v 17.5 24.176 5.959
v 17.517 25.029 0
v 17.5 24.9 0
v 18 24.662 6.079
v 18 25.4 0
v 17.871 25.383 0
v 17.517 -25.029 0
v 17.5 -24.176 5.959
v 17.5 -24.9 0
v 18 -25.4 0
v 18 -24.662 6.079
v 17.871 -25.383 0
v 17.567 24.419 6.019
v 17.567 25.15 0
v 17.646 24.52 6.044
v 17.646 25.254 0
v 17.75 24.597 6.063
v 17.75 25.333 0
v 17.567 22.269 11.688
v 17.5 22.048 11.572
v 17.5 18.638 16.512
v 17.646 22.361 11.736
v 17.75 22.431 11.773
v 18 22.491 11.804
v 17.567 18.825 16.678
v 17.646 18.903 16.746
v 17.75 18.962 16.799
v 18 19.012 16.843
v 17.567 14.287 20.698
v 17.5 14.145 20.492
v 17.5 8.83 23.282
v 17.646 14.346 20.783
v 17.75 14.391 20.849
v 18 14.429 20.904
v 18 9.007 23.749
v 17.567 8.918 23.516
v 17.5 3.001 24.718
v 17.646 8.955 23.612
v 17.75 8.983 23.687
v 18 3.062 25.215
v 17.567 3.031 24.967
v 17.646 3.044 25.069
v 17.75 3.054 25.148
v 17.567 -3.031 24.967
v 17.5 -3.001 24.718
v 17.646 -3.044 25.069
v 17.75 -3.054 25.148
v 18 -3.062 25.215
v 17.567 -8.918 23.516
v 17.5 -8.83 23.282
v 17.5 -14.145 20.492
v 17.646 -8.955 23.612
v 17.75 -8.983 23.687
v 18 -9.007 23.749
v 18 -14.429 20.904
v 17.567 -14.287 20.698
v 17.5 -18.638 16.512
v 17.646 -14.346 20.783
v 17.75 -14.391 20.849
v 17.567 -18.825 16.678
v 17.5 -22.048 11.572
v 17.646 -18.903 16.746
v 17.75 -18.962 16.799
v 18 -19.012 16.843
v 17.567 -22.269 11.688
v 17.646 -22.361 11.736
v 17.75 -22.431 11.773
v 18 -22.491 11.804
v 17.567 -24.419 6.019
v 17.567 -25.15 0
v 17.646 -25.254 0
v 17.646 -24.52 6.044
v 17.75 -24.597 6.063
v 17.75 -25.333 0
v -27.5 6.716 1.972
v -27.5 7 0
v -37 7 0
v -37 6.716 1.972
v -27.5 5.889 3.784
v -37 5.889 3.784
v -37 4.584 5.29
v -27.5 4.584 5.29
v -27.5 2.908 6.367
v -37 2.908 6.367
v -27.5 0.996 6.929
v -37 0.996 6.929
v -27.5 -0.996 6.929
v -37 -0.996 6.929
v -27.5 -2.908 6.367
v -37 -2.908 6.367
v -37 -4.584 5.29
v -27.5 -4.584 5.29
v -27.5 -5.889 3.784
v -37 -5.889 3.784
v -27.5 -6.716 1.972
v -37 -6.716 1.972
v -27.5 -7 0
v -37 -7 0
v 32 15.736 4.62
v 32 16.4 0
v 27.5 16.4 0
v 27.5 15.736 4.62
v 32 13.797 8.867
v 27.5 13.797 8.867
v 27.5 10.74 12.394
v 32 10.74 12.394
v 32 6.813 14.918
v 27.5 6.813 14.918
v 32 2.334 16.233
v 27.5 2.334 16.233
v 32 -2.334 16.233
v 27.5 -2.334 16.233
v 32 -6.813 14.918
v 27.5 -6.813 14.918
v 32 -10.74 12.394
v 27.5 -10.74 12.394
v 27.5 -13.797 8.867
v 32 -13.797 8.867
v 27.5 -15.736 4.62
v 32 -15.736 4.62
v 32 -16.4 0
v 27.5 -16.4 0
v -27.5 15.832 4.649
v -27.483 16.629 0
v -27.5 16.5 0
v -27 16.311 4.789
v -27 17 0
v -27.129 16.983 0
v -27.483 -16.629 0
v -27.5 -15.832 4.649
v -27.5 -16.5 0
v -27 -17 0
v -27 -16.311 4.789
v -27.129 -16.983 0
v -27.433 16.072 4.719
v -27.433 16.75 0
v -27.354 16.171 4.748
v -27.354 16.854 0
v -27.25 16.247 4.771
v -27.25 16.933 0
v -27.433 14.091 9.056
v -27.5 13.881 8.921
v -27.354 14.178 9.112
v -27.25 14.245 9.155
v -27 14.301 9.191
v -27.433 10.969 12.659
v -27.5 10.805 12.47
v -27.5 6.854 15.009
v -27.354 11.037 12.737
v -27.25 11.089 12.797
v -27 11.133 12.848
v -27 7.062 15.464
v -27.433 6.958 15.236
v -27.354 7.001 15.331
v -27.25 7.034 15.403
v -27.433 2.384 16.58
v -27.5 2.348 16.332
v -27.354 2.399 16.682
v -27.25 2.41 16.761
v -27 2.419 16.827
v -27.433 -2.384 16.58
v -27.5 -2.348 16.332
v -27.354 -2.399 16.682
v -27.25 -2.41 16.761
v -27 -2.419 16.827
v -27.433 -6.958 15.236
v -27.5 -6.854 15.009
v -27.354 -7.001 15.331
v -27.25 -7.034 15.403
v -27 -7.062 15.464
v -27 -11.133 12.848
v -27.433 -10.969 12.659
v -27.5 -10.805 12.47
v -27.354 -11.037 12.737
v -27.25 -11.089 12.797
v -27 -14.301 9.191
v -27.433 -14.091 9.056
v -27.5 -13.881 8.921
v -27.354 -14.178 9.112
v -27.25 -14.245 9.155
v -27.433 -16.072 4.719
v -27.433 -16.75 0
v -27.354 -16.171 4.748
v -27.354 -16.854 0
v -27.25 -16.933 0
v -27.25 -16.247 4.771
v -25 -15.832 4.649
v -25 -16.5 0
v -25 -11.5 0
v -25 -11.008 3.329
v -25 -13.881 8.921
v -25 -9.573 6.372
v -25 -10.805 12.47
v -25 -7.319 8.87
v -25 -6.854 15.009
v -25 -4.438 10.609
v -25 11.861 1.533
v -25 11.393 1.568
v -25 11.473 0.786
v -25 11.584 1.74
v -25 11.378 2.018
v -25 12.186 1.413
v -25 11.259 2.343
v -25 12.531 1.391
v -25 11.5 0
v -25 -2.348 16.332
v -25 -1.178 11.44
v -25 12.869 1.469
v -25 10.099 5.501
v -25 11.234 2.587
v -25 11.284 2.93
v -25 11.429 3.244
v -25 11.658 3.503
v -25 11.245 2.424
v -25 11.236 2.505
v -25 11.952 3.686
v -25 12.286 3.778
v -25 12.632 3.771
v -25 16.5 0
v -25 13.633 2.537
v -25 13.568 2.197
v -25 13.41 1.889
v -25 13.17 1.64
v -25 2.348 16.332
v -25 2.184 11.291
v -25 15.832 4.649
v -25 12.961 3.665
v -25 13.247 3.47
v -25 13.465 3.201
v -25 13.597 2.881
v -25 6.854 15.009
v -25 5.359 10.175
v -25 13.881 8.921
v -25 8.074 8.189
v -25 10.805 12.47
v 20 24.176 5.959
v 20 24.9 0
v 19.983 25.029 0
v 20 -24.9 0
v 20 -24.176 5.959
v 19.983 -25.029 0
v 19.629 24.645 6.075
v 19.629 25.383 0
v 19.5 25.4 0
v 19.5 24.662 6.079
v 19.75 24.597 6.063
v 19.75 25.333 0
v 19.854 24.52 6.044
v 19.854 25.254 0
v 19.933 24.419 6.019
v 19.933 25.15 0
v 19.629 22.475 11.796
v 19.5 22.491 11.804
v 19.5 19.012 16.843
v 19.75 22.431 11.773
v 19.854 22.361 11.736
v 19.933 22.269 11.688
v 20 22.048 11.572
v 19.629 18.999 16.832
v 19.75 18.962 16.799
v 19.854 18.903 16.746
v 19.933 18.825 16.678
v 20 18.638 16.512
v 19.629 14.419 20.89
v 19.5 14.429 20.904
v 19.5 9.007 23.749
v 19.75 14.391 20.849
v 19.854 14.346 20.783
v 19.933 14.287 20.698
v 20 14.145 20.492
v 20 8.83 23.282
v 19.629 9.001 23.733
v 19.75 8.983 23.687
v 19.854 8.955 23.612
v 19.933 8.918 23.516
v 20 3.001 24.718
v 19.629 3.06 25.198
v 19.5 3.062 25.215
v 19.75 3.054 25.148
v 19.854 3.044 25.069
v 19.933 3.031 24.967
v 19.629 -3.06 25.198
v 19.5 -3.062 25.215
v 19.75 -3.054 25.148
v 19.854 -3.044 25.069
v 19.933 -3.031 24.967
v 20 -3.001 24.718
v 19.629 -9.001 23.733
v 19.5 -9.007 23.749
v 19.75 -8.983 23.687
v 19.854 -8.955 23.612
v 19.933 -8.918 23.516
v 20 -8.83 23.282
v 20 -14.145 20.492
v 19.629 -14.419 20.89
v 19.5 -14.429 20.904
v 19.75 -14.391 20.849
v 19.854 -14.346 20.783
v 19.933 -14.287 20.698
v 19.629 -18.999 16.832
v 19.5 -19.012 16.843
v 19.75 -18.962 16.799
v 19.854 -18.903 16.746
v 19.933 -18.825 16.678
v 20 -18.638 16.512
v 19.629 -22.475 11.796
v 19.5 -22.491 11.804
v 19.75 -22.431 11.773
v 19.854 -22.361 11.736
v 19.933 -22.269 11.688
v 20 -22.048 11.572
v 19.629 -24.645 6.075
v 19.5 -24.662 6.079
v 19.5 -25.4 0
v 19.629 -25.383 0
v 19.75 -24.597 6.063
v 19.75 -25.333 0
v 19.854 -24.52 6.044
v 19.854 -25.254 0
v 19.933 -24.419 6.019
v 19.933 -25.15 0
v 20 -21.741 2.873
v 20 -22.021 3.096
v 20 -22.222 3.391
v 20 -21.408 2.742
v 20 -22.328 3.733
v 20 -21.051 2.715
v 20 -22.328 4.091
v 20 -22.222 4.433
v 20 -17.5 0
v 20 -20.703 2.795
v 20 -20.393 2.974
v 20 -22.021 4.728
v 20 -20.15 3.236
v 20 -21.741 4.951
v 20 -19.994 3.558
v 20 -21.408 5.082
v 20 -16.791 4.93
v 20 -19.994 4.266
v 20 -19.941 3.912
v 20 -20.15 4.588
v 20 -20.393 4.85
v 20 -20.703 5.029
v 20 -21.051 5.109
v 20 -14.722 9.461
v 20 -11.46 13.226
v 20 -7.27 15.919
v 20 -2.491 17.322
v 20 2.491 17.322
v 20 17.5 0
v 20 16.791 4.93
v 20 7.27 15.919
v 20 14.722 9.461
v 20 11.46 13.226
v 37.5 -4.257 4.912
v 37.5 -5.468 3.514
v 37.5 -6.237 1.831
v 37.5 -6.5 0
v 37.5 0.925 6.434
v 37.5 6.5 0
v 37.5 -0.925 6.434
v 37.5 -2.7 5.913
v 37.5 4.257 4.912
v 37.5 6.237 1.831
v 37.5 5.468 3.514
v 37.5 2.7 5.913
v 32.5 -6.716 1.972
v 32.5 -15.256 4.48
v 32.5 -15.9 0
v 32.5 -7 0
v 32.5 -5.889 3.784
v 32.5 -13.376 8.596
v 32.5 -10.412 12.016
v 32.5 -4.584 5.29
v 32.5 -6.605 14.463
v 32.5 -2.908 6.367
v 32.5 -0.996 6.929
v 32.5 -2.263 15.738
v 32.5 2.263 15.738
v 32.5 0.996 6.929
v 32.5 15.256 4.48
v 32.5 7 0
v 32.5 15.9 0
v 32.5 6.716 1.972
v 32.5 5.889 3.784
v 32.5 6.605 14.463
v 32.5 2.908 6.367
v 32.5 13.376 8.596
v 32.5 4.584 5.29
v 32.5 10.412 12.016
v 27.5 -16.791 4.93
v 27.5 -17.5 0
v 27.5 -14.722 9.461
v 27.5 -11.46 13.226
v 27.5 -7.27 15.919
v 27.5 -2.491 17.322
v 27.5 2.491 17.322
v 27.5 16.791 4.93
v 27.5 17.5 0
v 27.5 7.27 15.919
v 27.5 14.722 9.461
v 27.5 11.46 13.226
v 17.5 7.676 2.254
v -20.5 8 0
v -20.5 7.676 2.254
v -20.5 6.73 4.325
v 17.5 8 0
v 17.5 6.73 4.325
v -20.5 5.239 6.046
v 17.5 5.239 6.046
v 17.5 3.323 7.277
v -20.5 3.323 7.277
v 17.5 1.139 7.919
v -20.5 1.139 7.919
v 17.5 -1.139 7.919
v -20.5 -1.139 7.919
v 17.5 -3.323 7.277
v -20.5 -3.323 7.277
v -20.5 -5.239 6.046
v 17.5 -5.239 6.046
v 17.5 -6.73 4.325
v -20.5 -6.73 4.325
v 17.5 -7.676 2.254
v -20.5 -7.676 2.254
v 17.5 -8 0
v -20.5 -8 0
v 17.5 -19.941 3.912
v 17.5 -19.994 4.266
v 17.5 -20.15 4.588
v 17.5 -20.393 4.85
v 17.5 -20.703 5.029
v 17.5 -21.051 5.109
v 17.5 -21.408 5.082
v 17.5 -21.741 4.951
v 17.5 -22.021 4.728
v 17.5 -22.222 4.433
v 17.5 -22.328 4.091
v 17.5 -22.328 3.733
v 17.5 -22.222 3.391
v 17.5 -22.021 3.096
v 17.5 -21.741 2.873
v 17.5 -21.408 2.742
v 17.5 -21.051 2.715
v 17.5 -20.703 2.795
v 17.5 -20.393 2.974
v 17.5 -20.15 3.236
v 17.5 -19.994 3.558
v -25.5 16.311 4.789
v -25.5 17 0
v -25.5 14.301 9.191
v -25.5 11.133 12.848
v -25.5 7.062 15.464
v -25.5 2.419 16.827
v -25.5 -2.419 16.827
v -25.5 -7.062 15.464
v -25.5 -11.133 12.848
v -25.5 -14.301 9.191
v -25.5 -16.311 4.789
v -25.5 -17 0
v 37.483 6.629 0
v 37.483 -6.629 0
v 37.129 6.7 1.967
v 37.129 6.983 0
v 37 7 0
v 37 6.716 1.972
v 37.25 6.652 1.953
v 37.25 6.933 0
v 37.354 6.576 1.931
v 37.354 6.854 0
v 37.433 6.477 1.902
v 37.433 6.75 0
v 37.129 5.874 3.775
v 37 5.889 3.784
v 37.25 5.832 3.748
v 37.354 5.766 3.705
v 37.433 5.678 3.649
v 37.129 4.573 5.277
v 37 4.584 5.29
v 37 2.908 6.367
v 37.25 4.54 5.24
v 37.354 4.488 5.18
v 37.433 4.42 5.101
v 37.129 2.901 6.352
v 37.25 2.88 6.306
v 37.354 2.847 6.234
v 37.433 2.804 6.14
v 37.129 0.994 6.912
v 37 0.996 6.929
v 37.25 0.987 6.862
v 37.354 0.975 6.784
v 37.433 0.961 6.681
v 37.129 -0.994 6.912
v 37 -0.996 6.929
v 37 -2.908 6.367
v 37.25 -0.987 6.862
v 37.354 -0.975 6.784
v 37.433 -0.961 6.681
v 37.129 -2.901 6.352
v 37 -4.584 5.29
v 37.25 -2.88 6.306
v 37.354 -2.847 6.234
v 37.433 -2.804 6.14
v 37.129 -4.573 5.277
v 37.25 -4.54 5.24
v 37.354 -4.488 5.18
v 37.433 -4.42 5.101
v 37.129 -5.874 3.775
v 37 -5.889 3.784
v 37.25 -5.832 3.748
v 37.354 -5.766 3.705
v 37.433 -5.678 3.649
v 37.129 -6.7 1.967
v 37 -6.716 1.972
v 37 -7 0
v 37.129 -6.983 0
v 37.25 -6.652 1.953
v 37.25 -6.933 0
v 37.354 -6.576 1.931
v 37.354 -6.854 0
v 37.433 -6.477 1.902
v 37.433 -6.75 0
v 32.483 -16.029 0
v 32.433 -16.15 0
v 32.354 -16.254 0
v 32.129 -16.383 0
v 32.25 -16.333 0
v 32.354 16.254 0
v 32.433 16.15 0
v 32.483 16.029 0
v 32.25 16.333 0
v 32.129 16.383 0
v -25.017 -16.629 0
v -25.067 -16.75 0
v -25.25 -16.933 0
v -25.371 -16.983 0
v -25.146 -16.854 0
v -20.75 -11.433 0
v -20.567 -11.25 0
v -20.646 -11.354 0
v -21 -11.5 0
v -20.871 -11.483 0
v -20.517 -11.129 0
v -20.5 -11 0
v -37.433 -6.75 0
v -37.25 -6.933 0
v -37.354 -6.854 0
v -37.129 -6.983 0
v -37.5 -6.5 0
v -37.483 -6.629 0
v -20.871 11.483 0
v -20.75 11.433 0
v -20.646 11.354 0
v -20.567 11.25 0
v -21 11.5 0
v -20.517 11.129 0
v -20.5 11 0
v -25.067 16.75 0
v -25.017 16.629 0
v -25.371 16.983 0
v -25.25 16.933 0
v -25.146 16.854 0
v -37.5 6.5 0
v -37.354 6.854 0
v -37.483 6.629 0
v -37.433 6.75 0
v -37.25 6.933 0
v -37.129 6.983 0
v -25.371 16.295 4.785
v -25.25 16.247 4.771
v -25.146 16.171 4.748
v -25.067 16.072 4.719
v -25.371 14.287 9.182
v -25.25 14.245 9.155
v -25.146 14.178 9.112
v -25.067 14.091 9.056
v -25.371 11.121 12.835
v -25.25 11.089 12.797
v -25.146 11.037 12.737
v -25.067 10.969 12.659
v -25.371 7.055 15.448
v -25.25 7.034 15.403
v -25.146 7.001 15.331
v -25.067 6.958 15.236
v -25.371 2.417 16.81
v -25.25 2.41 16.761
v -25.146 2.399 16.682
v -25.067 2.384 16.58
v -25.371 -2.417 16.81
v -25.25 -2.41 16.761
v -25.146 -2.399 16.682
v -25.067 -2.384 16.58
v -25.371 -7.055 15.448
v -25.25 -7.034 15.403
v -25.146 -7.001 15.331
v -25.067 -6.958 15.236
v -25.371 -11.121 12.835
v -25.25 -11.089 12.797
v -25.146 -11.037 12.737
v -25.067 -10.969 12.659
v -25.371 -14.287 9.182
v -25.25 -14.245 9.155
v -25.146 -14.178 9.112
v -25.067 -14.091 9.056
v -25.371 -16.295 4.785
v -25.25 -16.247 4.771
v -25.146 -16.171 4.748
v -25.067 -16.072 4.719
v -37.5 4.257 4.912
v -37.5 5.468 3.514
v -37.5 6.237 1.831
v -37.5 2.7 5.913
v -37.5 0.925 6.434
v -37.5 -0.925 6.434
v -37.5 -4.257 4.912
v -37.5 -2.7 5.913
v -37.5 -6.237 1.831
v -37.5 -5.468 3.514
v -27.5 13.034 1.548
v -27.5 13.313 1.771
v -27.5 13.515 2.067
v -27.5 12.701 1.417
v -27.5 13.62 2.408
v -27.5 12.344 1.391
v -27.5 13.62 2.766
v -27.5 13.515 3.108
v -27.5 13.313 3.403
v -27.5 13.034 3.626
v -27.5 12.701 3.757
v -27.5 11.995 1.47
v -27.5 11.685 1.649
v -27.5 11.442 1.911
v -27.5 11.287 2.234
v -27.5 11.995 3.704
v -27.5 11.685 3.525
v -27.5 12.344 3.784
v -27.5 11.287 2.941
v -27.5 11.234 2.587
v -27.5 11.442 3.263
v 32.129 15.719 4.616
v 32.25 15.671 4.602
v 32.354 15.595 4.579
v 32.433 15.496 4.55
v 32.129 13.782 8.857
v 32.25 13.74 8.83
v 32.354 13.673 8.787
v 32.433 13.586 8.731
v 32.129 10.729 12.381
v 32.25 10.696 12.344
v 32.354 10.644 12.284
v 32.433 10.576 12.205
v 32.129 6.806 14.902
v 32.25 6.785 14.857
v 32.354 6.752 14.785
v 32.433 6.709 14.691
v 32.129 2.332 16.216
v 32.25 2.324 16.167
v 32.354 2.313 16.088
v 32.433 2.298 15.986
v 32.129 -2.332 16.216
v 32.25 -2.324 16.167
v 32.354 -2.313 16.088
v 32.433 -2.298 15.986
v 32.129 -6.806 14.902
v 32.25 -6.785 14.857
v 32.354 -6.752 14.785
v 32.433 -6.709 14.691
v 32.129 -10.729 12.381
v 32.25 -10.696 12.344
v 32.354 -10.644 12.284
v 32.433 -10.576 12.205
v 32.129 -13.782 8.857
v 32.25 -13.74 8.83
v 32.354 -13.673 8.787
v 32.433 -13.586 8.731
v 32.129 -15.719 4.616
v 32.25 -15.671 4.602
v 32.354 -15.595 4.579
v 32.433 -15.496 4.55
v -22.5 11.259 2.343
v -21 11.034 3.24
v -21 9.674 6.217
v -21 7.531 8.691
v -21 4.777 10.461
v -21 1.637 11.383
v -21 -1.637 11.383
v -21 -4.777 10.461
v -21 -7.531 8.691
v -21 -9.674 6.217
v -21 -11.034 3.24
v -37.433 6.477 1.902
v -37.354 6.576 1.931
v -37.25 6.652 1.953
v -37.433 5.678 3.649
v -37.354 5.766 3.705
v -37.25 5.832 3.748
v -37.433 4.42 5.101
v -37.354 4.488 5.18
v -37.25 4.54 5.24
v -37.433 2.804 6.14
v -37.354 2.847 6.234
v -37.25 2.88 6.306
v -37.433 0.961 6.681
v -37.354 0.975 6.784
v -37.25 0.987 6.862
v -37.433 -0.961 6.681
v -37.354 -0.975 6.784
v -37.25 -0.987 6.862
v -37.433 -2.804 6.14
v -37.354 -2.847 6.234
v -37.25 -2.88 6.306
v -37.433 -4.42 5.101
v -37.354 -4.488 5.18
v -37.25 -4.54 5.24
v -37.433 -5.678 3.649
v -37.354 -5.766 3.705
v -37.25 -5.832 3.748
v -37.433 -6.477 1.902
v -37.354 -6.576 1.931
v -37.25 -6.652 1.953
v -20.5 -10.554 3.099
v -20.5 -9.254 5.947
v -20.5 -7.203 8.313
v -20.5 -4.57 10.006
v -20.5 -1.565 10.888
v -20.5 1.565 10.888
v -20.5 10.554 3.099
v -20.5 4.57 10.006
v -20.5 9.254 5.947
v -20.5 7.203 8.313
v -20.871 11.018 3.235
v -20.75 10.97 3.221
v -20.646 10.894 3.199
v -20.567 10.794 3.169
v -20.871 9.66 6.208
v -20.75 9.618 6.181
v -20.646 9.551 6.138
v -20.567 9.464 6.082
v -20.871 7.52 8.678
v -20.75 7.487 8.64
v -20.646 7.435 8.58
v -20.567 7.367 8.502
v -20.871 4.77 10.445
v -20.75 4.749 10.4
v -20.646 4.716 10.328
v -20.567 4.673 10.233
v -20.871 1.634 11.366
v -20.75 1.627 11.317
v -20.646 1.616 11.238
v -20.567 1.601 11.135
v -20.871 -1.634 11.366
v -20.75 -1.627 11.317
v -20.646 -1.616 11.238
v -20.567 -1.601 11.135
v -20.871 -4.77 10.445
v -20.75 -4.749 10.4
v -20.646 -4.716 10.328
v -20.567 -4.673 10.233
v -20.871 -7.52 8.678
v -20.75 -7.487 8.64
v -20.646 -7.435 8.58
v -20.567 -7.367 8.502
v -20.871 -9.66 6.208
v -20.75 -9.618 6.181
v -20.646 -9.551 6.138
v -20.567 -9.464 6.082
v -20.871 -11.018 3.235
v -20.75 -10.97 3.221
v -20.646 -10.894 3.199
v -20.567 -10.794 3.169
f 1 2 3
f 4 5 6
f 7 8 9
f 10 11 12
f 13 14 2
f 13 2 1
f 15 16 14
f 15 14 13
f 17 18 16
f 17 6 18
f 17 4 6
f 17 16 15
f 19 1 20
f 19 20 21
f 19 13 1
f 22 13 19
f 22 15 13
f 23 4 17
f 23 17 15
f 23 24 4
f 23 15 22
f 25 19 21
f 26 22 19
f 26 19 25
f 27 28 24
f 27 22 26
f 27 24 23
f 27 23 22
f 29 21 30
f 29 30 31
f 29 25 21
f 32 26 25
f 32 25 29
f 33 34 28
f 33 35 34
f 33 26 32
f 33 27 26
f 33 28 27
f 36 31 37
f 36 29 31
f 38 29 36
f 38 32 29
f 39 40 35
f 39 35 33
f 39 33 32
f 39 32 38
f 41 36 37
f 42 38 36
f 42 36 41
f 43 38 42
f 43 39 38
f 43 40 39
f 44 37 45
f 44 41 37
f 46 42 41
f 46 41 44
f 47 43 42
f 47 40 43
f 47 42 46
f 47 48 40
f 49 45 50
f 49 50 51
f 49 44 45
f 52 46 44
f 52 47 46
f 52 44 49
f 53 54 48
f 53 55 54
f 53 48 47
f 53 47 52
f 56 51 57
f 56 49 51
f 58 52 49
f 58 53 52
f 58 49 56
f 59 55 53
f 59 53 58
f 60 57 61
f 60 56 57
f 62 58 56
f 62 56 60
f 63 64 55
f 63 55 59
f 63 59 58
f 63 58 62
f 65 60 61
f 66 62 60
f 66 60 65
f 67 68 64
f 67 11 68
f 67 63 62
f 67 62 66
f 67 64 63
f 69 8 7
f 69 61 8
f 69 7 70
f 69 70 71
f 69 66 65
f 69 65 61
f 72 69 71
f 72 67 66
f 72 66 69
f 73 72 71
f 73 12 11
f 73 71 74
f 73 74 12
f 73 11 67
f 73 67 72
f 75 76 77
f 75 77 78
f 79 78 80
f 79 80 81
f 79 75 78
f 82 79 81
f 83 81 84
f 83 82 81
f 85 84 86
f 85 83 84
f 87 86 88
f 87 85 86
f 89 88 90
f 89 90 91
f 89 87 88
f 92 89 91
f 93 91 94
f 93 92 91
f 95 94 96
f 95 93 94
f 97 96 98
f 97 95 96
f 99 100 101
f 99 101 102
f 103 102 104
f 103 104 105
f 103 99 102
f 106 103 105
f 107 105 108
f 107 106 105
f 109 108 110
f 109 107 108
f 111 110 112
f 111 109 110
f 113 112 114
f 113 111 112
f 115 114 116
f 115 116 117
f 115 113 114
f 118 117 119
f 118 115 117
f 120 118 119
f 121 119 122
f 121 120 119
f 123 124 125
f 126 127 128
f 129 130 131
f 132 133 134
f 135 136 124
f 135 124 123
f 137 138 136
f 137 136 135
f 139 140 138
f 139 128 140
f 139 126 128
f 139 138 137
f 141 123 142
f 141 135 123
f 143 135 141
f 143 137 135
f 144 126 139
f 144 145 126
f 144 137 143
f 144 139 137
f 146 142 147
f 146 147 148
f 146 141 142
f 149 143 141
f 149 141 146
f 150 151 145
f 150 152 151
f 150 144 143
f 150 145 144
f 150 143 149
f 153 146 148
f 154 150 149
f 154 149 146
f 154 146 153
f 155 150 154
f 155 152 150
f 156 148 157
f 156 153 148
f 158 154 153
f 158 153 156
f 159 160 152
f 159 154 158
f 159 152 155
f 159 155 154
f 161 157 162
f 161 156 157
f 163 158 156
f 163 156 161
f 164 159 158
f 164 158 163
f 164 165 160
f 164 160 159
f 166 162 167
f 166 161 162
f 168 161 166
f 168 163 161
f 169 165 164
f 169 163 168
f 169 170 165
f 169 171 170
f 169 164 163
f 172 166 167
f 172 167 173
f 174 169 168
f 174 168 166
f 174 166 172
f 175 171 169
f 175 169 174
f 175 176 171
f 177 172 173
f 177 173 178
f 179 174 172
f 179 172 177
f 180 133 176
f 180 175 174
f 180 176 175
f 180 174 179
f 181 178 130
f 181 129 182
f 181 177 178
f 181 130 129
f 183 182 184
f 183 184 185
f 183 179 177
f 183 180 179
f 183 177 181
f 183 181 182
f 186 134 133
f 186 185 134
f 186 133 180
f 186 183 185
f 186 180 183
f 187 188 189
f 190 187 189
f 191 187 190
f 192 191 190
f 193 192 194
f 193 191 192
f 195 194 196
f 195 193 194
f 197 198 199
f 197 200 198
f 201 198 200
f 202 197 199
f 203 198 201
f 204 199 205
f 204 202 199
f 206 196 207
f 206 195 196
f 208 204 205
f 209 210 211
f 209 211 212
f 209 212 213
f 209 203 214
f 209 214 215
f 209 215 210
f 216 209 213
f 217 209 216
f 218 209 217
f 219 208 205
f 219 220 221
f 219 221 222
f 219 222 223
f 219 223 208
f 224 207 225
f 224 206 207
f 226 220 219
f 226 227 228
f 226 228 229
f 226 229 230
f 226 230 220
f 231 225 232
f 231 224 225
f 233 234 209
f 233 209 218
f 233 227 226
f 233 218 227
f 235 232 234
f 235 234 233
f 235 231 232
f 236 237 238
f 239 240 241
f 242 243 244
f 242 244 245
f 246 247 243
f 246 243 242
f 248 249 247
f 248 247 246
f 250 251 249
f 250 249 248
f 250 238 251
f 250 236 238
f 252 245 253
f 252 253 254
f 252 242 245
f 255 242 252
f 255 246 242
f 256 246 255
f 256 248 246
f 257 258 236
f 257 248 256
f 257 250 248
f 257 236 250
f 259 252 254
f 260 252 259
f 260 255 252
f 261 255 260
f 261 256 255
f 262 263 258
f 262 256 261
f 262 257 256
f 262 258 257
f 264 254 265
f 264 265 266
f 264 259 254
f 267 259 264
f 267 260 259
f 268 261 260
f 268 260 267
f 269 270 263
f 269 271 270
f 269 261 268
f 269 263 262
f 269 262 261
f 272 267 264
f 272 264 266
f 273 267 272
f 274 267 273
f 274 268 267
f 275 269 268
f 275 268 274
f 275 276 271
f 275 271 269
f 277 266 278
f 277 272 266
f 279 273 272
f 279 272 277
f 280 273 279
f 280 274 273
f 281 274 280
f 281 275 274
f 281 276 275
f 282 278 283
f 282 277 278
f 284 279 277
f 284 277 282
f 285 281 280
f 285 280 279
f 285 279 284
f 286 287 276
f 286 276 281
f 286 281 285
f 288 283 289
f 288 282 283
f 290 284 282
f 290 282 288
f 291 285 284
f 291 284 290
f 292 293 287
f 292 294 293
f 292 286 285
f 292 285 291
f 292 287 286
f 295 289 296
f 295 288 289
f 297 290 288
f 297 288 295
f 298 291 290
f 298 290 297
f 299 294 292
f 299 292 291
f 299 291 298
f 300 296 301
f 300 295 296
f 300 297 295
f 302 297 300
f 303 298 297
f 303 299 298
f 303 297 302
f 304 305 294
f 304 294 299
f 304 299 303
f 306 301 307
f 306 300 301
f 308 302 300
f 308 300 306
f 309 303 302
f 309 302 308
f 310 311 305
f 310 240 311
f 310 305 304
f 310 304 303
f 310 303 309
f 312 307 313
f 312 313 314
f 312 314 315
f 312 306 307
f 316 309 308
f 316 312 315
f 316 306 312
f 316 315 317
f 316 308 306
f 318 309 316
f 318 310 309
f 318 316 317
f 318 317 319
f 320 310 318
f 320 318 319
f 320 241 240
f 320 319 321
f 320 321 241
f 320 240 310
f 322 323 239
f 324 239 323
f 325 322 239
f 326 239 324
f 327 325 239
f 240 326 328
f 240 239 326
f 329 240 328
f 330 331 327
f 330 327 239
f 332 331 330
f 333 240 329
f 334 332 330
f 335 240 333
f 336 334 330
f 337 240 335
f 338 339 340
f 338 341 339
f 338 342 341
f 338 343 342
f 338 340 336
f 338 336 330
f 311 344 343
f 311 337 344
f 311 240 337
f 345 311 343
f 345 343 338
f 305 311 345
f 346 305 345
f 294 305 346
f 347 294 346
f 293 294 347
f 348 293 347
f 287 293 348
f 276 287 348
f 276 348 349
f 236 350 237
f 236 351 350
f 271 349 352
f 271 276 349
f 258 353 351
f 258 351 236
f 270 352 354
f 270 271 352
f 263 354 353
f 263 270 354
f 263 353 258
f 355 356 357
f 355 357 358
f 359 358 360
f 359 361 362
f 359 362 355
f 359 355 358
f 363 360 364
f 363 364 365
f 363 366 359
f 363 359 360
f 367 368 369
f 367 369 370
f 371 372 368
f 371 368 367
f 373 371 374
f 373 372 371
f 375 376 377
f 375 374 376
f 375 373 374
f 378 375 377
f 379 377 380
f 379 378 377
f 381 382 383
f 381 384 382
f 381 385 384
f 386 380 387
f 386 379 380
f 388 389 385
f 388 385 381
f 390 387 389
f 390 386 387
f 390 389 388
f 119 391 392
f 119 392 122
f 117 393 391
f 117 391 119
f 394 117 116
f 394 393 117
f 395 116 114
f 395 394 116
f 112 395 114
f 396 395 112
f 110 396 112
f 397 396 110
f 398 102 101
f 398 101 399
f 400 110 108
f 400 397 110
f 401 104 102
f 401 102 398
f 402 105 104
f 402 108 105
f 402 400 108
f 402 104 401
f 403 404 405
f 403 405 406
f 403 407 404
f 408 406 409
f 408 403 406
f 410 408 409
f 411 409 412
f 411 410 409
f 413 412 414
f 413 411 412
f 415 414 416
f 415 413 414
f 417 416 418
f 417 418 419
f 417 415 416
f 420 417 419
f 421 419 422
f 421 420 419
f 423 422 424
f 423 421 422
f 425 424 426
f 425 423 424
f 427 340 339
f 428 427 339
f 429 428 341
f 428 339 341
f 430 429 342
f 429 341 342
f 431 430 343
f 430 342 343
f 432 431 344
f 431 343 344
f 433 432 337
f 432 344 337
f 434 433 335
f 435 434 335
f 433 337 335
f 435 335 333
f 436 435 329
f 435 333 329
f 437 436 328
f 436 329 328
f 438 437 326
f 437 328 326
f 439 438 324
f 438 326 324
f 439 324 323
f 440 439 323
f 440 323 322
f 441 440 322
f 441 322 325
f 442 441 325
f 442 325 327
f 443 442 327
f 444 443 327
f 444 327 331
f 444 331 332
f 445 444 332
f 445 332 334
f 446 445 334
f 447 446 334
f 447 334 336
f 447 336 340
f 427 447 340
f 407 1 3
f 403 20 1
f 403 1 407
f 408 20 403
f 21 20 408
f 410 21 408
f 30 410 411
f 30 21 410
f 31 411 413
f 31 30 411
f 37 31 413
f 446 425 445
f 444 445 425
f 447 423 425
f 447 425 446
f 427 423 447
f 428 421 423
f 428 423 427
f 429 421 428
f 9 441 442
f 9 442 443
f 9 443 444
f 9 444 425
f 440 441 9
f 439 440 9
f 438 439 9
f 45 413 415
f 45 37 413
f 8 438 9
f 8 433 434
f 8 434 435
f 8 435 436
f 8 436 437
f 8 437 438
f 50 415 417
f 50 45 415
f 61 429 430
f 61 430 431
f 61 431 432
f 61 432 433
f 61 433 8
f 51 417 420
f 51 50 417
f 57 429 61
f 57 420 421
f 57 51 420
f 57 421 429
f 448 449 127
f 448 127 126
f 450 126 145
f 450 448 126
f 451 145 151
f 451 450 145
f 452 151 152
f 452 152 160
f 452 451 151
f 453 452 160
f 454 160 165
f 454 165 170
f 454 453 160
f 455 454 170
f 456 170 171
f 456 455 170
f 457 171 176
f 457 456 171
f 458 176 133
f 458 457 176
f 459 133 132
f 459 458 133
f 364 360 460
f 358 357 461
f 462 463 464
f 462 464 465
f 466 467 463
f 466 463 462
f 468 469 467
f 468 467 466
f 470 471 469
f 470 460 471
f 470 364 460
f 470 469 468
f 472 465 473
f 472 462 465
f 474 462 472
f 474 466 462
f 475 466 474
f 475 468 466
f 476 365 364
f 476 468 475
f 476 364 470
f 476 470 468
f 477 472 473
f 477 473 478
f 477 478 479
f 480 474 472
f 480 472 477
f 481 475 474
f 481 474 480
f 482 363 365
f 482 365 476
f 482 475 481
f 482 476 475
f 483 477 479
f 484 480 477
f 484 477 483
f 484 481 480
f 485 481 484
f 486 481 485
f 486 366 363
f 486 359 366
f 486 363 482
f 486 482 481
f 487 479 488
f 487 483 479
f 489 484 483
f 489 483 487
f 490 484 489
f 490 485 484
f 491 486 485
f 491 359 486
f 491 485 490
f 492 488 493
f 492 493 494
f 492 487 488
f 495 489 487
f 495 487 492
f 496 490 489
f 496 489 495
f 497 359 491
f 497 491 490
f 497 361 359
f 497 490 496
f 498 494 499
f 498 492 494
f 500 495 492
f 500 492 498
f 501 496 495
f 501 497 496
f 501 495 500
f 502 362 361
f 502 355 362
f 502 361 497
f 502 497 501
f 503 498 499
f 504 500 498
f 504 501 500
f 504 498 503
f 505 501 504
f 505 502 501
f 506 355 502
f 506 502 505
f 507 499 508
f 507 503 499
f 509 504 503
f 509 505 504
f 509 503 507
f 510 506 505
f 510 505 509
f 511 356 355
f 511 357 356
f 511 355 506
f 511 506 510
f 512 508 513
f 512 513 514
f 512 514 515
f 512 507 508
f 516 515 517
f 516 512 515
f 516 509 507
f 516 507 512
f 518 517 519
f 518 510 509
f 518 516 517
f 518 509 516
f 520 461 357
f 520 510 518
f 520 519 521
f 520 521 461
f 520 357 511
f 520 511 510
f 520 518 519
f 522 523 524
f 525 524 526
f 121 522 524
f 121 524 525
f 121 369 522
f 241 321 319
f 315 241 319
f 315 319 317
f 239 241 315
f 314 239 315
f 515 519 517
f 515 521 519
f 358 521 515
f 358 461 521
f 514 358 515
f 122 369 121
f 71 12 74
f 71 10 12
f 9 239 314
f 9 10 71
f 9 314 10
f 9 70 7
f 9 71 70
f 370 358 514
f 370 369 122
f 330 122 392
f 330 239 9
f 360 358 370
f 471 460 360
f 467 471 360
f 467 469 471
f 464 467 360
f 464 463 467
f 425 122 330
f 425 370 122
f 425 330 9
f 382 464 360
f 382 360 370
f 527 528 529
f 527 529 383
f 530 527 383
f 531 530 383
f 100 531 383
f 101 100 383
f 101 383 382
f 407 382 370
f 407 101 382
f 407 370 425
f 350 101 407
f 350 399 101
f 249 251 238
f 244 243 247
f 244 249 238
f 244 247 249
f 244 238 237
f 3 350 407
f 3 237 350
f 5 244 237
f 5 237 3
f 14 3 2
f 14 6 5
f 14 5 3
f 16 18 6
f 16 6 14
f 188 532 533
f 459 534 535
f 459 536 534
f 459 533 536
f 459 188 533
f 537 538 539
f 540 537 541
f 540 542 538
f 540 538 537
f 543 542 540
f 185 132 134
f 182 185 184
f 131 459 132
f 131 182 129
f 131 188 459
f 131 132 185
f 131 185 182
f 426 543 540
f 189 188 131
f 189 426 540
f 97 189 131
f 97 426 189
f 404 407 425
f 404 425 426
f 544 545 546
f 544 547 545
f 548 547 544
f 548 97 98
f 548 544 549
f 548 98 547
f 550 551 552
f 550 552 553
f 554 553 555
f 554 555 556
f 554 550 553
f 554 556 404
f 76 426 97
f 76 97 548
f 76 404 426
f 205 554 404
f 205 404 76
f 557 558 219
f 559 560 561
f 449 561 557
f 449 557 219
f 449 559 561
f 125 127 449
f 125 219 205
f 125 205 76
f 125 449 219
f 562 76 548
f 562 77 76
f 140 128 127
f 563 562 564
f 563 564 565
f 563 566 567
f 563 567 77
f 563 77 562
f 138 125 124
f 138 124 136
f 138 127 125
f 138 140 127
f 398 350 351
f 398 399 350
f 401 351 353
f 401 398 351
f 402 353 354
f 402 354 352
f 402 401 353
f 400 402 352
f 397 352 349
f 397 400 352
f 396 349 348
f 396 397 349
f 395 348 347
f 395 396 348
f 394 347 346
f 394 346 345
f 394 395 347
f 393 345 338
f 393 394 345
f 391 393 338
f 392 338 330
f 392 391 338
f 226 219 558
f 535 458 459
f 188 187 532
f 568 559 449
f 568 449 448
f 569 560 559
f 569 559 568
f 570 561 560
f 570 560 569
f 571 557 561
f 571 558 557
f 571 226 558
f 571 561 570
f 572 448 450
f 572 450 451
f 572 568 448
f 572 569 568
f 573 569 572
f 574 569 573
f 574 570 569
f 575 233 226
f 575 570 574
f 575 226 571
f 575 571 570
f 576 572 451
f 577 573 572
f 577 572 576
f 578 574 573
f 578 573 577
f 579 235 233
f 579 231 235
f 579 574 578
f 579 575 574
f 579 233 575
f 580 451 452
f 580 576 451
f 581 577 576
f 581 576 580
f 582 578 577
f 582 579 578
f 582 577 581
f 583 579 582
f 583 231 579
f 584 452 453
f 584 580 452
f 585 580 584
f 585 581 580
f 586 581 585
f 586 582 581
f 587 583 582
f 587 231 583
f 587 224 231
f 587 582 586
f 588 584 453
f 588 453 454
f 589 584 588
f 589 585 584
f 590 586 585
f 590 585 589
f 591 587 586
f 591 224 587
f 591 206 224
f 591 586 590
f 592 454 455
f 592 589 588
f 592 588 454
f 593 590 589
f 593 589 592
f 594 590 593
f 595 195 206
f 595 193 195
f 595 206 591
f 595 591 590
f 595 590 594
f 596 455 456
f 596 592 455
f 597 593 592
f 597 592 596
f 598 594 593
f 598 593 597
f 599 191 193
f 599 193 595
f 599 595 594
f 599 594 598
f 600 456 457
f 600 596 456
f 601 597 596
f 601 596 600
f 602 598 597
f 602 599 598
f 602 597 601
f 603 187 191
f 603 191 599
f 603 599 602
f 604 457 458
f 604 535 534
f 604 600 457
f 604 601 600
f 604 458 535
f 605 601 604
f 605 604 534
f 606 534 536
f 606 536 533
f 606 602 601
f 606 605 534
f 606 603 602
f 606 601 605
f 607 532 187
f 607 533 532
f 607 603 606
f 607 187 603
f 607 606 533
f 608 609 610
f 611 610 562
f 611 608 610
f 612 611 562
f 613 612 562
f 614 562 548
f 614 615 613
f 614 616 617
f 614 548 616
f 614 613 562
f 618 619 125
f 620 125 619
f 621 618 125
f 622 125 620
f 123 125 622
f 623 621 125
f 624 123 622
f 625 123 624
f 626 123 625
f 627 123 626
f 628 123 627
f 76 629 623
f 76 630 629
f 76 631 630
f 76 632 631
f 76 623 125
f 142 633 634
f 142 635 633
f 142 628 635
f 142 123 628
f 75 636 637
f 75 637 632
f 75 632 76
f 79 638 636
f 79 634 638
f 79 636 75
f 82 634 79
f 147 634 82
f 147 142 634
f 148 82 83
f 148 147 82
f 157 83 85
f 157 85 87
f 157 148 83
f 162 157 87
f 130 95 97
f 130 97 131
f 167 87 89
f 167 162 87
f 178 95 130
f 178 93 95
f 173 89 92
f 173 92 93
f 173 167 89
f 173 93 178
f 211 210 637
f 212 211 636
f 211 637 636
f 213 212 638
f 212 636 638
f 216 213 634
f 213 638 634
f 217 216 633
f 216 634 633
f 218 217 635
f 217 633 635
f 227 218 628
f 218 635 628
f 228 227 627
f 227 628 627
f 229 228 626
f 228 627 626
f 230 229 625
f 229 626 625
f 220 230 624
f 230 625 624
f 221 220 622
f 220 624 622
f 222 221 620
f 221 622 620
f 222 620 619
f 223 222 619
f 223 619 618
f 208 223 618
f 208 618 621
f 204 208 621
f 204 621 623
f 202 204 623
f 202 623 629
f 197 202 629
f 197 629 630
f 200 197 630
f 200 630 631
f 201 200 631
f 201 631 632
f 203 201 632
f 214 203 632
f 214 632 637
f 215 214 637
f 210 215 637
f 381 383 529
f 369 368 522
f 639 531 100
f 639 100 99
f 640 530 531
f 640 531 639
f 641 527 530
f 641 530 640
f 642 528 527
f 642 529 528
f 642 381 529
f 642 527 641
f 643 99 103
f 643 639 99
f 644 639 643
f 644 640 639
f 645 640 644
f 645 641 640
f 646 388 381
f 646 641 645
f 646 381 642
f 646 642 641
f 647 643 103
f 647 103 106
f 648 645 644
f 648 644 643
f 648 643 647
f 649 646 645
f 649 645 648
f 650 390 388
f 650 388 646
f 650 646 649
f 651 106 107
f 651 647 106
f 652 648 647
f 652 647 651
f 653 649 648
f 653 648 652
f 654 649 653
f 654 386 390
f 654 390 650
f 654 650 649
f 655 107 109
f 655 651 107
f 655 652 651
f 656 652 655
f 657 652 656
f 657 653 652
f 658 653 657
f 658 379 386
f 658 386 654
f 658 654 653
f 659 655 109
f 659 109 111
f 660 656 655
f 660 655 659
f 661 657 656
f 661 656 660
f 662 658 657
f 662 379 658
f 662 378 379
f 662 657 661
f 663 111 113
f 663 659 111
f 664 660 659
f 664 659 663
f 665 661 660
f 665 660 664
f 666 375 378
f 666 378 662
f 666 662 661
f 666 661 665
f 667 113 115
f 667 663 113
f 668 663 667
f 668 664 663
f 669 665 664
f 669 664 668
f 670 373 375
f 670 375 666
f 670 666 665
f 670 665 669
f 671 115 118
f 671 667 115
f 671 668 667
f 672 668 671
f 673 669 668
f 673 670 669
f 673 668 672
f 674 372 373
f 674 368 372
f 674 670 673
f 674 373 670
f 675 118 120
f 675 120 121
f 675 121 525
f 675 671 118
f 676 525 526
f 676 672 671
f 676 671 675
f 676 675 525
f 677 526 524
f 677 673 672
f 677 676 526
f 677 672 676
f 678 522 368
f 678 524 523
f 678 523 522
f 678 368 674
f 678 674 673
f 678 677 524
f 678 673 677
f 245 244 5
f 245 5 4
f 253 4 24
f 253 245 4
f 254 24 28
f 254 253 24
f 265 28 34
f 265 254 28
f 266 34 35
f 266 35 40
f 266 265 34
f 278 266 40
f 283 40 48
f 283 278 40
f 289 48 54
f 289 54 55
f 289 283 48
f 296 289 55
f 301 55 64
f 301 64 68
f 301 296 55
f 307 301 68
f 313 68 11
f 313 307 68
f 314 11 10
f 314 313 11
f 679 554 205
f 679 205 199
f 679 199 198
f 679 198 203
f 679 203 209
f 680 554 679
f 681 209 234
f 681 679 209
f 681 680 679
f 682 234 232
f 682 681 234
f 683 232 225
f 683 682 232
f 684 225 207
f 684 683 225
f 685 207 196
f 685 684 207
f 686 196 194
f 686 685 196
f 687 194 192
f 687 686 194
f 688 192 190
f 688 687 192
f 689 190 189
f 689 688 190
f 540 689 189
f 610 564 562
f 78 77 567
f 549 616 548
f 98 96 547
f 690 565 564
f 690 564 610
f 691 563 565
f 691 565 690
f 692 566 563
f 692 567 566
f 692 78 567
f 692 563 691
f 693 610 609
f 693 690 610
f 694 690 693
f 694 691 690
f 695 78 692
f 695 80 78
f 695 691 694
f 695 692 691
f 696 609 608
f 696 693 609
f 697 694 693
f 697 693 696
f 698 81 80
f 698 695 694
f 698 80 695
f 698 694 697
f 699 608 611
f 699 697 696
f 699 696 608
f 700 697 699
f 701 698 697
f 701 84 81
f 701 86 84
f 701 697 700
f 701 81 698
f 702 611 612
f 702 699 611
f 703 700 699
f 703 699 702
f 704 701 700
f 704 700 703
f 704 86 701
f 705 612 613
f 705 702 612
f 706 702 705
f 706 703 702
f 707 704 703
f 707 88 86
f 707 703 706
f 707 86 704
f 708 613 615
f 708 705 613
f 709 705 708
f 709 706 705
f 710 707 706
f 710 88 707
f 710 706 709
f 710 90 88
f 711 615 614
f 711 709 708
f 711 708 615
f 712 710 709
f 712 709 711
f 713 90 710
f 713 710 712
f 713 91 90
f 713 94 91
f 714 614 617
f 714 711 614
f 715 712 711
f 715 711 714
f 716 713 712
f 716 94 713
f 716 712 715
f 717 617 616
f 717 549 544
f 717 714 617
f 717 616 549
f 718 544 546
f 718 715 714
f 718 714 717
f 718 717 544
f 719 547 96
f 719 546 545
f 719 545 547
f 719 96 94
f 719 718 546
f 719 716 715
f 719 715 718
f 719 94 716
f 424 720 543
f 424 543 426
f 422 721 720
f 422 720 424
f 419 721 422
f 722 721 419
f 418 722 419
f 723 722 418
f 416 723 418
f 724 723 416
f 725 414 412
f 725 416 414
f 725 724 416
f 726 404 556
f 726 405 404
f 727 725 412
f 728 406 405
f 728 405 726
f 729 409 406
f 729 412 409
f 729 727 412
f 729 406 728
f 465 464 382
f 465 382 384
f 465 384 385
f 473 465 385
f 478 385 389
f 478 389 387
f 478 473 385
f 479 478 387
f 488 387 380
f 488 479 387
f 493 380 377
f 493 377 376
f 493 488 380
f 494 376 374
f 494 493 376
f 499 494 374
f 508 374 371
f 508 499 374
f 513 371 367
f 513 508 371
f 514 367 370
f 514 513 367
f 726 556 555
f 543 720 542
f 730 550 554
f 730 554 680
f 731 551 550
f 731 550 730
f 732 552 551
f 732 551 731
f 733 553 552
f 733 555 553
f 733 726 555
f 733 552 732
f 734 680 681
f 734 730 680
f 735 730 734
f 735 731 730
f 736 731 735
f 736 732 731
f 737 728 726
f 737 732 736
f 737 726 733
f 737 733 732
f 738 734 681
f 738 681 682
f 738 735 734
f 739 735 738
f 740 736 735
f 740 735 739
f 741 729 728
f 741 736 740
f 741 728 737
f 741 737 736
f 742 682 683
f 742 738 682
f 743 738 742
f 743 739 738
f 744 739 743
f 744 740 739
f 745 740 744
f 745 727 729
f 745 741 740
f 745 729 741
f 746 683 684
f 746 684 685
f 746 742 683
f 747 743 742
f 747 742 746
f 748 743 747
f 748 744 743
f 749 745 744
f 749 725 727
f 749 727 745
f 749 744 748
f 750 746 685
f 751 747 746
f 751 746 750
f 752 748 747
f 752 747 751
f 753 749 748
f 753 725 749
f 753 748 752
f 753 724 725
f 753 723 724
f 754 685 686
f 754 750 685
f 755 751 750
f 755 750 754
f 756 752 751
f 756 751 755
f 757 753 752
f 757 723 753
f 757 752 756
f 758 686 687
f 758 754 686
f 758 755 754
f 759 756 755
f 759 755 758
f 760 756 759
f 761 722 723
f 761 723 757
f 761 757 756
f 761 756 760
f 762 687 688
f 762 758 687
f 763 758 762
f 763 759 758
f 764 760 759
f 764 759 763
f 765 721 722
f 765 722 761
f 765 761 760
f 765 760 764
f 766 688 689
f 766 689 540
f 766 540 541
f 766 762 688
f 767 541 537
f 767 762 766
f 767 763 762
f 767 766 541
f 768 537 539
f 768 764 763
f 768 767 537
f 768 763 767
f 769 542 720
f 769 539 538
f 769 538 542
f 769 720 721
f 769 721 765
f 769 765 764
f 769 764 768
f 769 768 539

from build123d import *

# Parameters (mm, degrees)
REVOLUTION_ANGLE = 180
SKETCH002_R      = 1.2
POCKET_DEPTH     = 5
SKETCH003_R      = 1.2
POCKET001_DEPTH  = 5
FILLET_R         = 0.5


with BuildPart() as part:
    # Sketch → Revolution (revolve)
    with BuildSketch(Plane.XY):
        Polygon((-37.5, 0), (-37.5, 7), (-27.5, 7), (-27.5, 17), (-25, 17), (-25, 11.5), (-20.5, 11.5), (-20.5, 8), (17.5, 8), (17.5, 25.4), (20, 25.4), (20, 17.5), (27.5, 17.5), (27.5, 16.4), (32.5, 16.4), (32.5, 7), (37.5, 7), (37.5, 0), align=None)
    revolve(axis=Axis((0, 0, 0), (1, 0, 0)), revolution_arc=REVOLUTION_ANGLE)

    # Sketch002 → Pocket (cut)
    with BuildSketch(Plane(origin=(-27.5, 0, 0), x_dir=(0, -1, 0), z_dir=(-1, 0, 0))):
        with Locations((-12.433667, 2.587262)):
            Circle(SKETCH002_R)
    extrude(amount=-POCKET_DEPTH, mode=Mode.SUBTRACT)

    # Sketch003 → Pocket001 (cut)
    with BuildSketch(Plane.YZ.offset(20)):
        with Locations((-21.141078, 3.912139)):
            Circle(SKETCH003_R)
    extrude(amount=-POCKET001_DEPTH, mode=Mode.SUBTRACT)

    # Fillet
    fillet_edges = [part.edges().sort_by_distance(p)[0] for p in [
        (-27.5, 0, 17),
        (-25, 0, 17),
        (-20.5, 0, 11.5),
        (17.5, 0, 25.4),
        (20, 0, 25.4),
        (32.5, 0, 16.4),
        (37.5, 0, 7),
        (-37.5, 0, 7),
    ]]
    fillet(fillet_edges, radius=FILLET_R)


solid = part.part
